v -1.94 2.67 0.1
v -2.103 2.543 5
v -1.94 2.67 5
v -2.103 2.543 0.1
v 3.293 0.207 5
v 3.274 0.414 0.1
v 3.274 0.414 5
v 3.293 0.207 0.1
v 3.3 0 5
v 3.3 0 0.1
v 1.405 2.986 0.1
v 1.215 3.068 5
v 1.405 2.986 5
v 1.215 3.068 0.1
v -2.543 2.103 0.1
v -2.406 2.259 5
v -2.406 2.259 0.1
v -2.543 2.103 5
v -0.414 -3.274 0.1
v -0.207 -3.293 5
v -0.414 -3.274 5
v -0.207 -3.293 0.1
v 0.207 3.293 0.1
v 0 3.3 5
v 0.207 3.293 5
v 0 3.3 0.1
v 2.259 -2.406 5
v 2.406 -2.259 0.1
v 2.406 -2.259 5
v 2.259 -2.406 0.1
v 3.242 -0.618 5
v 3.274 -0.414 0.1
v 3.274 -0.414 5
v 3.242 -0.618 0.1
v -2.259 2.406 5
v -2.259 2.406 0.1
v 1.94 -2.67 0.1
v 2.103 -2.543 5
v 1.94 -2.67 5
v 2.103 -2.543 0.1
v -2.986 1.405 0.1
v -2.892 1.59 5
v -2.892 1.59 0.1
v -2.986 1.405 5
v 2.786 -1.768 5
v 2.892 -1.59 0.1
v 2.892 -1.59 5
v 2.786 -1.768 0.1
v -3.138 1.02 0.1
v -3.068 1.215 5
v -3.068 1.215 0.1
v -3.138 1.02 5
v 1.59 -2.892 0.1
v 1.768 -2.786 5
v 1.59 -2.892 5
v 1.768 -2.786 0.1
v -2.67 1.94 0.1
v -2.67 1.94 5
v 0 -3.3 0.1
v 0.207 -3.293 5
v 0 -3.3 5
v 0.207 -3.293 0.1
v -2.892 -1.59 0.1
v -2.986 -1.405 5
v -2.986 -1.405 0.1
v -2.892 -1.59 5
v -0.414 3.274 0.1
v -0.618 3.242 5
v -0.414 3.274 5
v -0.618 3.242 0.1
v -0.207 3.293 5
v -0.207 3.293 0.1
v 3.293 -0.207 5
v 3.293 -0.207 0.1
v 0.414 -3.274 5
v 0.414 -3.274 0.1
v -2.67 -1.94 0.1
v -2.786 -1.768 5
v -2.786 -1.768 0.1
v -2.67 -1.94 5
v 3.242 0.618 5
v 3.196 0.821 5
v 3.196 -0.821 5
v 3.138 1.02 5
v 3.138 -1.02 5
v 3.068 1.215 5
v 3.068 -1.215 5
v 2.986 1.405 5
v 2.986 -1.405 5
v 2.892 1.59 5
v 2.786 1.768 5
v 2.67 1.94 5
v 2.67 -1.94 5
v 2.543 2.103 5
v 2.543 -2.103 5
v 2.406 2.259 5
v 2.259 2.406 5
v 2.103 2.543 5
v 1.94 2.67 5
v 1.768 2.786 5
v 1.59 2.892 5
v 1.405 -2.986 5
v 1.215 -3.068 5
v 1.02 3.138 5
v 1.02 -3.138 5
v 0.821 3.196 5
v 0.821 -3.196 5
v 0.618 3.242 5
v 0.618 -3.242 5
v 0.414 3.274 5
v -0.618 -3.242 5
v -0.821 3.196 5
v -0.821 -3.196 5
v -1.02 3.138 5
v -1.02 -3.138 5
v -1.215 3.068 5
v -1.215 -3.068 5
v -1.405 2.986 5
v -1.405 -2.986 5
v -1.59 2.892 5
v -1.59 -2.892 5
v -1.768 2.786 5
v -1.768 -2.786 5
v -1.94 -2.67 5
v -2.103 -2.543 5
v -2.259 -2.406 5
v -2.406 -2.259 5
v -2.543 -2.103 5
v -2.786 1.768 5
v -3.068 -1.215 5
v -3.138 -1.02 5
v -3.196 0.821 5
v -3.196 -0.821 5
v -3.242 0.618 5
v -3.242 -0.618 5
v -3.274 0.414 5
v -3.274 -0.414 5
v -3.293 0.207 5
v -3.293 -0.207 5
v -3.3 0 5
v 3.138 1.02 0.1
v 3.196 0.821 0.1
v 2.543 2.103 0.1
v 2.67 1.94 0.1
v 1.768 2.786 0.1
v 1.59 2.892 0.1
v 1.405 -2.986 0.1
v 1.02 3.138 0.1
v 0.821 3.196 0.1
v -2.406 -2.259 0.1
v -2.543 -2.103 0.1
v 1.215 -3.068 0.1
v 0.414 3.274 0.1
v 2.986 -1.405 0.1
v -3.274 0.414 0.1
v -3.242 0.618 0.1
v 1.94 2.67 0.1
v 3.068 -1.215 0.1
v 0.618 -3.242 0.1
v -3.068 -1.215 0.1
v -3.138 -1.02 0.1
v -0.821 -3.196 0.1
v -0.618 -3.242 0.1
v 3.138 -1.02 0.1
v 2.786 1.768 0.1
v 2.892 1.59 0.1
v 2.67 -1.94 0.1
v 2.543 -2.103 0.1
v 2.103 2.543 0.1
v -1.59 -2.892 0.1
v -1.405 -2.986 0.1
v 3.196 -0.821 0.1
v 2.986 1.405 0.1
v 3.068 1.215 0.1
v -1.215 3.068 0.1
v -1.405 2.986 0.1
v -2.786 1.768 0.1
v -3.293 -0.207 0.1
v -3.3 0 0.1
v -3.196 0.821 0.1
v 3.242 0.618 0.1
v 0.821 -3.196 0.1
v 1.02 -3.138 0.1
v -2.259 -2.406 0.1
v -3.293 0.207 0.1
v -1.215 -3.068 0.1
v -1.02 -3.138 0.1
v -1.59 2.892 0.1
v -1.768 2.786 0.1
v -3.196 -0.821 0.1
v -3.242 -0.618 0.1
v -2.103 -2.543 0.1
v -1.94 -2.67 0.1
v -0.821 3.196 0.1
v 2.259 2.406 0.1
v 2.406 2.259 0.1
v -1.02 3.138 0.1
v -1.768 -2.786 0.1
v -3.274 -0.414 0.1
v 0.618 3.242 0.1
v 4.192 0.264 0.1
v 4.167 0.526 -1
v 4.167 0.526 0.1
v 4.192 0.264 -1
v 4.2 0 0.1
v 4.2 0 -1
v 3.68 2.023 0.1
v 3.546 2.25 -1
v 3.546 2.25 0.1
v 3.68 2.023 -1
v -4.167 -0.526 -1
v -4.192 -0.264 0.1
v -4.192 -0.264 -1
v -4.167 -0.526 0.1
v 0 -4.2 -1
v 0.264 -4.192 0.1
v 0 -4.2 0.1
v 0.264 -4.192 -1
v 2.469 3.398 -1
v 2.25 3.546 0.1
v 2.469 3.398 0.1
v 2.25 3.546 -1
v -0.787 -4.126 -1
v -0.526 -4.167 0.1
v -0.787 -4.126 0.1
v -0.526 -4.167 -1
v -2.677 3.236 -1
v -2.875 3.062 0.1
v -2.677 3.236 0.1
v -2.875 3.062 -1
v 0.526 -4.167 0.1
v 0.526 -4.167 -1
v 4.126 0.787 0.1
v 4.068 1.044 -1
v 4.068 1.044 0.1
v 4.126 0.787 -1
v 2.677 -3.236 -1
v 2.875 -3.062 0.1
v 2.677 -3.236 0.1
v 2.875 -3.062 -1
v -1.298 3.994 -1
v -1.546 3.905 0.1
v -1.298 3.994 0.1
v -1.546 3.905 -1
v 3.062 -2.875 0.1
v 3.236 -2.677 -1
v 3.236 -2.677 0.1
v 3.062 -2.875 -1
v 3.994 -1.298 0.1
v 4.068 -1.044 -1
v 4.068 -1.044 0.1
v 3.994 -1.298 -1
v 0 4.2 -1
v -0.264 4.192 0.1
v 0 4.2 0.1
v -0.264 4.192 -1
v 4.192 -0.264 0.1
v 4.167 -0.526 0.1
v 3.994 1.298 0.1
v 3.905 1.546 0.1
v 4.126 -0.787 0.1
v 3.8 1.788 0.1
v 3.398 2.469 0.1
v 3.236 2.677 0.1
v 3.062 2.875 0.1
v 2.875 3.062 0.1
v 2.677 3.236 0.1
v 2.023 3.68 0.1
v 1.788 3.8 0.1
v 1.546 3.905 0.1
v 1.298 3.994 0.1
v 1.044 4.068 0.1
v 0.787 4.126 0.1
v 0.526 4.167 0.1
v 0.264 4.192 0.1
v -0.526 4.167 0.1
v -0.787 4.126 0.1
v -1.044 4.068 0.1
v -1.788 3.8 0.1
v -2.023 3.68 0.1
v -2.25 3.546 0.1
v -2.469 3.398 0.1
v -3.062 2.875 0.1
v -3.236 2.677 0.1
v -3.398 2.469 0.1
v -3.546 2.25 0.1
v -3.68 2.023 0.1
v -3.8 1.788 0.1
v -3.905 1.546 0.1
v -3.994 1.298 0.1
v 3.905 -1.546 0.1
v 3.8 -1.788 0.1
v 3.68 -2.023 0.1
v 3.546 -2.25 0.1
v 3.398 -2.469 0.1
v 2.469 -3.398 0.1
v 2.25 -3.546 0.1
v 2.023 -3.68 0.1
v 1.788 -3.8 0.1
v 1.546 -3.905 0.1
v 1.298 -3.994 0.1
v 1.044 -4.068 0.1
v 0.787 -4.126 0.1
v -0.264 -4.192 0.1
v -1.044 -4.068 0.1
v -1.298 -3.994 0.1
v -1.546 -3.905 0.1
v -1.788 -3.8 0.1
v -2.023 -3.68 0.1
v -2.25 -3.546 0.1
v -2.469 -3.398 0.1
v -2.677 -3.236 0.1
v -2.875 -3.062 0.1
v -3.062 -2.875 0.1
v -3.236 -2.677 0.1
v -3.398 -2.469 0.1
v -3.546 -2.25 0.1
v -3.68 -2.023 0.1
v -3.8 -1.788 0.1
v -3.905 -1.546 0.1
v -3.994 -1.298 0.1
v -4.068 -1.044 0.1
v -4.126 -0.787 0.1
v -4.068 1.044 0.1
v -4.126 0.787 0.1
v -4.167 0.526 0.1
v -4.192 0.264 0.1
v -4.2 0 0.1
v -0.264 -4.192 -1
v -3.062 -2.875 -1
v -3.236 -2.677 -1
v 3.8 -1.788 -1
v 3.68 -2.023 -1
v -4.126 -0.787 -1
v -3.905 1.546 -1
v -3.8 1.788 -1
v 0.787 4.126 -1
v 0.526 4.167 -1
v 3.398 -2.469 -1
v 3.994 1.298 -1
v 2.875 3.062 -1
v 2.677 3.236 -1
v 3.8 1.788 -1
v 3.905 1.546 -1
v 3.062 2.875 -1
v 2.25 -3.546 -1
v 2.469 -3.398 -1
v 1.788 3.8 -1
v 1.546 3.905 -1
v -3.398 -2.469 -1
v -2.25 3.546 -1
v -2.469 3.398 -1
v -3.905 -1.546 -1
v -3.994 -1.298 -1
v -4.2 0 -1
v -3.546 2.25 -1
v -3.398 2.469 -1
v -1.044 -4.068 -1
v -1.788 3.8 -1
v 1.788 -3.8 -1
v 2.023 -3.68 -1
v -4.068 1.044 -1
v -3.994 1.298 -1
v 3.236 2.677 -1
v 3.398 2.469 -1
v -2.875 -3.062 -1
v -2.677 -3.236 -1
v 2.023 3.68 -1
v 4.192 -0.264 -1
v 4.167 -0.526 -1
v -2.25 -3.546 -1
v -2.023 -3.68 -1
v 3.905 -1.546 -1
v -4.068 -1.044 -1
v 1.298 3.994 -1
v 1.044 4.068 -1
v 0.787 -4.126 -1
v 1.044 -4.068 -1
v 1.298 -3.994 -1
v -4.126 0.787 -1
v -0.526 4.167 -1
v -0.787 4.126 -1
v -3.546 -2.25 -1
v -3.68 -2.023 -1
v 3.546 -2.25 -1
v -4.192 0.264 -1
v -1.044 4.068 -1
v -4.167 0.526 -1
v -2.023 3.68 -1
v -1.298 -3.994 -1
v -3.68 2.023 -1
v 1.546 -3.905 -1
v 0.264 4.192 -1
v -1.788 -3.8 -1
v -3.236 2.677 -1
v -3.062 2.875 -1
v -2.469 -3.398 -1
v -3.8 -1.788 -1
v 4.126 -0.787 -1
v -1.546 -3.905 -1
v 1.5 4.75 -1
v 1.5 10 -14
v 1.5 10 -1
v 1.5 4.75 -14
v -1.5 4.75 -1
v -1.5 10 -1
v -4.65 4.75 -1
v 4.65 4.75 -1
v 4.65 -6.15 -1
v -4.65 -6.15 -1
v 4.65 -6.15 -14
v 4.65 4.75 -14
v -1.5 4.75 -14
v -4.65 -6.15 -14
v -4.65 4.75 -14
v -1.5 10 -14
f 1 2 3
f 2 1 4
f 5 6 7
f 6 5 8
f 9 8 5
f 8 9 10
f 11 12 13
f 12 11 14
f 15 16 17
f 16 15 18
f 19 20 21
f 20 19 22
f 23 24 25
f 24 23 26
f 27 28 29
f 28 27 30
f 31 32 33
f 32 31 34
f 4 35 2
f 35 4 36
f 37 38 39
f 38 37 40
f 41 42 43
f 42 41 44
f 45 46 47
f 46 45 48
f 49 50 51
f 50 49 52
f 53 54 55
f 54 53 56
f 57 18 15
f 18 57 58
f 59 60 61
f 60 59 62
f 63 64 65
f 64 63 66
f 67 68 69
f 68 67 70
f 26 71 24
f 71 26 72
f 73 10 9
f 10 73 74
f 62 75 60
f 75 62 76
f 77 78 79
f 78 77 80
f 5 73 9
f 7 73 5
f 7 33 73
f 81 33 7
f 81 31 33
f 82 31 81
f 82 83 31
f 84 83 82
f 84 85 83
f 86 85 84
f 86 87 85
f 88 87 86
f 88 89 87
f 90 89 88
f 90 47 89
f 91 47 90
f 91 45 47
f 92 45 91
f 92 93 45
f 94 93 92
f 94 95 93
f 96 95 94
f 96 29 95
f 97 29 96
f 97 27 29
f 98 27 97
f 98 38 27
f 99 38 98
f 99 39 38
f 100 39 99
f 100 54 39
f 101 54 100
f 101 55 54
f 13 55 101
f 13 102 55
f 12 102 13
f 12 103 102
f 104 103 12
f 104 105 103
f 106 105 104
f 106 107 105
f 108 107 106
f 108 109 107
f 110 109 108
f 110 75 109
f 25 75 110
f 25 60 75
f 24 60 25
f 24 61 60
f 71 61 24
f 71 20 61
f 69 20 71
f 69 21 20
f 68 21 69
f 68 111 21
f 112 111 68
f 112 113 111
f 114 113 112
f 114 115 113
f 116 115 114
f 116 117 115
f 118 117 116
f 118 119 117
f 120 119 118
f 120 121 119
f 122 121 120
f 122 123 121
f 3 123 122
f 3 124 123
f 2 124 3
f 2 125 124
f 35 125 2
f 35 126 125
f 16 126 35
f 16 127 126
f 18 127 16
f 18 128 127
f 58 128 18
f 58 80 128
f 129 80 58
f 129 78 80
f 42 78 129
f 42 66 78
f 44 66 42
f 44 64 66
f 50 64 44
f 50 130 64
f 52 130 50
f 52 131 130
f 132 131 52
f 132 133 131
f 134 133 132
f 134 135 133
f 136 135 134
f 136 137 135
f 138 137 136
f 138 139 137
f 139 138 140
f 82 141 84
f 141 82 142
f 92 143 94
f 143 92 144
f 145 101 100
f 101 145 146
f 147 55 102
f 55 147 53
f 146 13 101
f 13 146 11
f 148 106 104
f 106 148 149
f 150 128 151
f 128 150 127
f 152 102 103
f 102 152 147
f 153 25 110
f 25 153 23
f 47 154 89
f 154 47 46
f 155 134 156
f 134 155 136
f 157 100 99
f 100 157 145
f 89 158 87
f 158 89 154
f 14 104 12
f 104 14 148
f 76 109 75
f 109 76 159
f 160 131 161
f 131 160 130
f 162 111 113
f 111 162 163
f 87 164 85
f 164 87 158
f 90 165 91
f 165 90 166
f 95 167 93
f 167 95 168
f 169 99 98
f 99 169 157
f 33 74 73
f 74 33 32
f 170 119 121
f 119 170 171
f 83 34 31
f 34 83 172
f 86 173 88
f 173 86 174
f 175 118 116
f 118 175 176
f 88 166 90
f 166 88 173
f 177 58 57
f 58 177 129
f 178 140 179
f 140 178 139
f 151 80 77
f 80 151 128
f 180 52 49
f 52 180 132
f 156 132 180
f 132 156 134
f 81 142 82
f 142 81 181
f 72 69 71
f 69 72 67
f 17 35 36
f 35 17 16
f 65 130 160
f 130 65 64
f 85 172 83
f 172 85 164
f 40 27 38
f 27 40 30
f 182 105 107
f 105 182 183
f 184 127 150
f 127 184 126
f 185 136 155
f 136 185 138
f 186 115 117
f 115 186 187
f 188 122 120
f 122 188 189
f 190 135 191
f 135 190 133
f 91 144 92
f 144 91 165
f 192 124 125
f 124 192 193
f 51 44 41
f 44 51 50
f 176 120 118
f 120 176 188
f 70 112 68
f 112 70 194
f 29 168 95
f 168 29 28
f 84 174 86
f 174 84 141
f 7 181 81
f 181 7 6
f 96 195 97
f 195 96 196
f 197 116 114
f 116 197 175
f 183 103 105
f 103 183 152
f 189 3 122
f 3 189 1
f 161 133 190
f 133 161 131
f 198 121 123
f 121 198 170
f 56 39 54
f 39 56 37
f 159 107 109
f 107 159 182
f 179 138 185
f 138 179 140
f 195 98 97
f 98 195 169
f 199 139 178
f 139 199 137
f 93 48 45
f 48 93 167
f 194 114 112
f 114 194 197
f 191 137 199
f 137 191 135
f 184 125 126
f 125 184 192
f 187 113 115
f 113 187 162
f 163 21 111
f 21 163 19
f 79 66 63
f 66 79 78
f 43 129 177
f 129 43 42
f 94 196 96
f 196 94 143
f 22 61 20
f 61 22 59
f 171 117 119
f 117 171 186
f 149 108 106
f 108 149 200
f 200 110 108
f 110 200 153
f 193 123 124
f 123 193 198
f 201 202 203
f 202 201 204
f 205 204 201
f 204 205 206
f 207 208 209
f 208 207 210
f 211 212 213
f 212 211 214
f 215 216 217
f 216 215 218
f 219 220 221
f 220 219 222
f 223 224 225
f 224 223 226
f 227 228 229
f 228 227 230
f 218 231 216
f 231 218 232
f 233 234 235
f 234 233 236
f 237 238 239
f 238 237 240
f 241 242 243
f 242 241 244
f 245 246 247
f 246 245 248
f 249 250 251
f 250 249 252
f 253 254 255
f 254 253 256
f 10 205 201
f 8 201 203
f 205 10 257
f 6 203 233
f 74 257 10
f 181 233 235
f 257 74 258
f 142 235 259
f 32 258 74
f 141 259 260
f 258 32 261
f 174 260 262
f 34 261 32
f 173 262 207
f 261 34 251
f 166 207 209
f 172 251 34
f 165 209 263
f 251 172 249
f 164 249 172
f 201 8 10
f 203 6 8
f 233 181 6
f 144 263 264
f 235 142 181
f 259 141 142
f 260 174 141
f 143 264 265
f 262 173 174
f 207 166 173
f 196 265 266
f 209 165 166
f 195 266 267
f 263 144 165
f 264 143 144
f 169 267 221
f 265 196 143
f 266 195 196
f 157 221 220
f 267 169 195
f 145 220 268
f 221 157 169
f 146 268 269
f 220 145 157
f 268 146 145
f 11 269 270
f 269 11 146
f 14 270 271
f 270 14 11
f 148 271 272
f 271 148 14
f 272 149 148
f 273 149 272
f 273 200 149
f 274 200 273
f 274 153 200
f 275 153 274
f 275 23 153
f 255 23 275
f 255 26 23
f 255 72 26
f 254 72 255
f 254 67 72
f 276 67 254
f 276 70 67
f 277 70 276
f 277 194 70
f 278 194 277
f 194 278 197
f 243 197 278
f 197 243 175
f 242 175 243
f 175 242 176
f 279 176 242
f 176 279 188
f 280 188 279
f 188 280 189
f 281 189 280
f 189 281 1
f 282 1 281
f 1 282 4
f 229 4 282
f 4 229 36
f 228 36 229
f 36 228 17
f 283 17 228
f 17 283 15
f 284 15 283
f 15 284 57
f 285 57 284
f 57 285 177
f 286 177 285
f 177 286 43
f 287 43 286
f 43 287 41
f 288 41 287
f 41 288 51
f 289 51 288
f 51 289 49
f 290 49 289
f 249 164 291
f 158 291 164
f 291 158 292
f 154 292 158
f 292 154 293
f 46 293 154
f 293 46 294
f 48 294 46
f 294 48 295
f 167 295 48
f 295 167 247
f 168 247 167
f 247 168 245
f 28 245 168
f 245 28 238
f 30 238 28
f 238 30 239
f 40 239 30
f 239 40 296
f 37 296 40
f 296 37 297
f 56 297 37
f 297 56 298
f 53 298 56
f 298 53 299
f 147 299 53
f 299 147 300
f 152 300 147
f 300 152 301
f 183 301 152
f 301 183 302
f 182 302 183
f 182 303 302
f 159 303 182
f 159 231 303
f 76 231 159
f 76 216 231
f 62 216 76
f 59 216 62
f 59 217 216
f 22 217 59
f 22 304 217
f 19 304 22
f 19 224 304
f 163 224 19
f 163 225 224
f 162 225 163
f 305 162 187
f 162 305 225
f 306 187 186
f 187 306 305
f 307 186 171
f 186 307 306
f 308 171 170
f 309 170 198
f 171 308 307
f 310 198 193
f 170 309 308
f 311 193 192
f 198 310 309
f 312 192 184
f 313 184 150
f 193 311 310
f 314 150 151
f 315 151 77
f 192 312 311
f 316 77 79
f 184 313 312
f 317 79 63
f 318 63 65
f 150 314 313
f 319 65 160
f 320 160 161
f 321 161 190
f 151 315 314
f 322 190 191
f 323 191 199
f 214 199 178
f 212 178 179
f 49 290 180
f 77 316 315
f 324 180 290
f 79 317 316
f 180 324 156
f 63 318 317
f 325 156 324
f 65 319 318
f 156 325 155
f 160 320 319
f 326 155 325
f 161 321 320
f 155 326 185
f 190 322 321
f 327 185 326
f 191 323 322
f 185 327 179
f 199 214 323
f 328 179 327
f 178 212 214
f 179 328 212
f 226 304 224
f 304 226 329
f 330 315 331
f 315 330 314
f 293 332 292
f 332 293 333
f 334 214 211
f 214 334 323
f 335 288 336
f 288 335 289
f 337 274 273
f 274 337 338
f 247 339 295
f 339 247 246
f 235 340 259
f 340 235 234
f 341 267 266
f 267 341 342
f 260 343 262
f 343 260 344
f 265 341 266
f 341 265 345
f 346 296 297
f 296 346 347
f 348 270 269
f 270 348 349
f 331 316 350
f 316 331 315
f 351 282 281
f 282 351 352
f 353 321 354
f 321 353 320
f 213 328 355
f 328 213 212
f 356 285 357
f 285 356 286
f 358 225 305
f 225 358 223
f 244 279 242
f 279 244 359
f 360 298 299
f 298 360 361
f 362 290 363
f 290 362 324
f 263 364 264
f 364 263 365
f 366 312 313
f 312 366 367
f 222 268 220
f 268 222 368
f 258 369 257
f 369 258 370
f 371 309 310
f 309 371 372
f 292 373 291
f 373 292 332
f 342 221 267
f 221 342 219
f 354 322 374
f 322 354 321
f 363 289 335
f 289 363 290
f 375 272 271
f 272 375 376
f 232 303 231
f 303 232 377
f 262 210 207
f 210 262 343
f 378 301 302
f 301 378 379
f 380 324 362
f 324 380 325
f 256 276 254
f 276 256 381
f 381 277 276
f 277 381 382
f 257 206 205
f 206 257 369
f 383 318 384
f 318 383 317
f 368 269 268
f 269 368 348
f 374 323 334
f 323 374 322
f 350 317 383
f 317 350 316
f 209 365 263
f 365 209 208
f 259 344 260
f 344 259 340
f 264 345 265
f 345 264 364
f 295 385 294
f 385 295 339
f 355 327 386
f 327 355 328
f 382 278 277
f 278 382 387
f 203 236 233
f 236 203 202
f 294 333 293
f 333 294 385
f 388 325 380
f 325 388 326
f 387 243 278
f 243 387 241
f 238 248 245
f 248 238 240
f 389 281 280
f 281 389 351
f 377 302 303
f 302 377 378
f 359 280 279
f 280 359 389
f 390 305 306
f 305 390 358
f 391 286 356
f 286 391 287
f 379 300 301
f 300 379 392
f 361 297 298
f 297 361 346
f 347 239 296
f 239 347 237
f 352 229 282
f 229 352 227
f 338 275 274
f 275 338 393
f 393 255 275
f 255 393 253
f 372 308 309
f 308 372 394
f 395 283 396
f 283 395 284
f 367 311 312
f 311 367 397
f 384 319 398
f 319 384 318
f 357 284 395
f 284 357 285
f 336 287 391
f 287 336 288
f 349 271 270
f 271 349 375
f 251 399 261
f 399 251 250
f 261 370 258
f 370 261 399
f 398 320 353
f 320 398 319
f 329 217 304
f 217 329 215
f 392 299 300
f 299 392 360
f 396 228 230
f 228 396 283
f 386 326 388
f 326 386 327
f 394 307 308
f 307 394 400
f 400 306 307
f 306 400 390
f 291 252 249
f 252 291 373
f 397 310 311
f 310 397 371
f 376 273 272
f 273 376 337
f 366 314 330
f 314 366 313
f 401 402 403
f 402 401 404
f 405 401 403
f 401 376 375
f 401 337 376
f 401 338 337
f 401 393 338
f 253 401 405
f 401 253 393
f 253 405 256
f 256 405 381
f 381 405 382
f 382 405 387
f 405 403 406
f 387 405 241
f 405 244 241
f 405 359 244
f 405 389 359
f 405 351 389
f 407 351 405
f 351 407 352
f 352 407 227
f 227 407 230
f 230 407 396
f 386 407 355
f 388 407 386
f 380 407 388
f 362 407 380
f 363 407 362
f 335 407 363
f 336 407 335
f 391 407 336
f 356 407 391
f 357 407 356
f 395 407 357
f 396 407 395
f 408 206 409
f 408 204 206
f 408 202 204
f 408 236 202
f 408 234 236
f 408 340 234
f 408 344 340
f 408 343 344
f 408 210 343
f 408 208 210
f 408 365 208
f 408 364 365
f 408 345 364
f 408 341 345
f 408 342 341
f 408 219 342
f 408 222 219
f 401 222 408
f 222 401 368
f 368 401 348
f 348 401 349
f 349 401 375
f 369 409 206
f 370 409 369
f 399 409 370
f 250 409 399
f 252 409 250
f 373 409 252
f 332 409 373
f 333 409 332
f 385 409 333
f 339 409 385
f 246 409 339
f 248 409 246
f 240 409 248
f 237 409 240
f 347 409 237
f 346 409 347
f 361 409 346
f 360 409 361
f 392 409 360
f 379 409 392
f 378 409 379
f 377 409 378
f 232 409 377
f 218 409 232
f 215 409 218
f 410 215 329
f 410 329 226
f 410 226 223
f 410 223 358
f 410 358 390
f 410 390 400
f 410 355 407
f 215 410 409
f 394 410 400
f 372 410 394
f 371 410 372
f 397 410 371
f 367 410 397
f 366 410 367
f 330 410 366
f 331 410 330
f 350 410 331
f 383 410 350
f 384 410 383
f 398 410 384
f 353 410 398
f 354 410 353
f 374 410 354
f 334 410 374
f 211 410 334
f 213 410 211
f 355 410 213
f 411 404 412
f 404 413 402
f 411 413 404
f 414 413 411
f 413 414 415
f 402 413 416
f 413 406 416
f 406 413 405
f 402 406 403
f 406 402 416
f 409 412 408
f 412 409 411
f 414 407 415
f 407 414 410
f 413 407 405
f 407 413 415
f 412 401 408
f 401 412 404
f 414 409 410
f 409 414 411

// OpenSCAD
tolerance = 0.3;
$fn = $preview ? 20 : 100;

module jack_35mm() {
    cylinder(r = 3 + tolerance, h = 5);
    
    translate([0, 0, -1.1])
    cylinder(r = 4.2, h = 1.2);
        
    translate([-1.5, 0, -14])
    cube([3, 10, 13]);

    box_width = 9 + tolerance;
    translate([-box_width / 2, -6 - tolerance / 2, -14])
    cube([box_width, 10.6 + tolerance, 13]);
}

jack_35mm();
